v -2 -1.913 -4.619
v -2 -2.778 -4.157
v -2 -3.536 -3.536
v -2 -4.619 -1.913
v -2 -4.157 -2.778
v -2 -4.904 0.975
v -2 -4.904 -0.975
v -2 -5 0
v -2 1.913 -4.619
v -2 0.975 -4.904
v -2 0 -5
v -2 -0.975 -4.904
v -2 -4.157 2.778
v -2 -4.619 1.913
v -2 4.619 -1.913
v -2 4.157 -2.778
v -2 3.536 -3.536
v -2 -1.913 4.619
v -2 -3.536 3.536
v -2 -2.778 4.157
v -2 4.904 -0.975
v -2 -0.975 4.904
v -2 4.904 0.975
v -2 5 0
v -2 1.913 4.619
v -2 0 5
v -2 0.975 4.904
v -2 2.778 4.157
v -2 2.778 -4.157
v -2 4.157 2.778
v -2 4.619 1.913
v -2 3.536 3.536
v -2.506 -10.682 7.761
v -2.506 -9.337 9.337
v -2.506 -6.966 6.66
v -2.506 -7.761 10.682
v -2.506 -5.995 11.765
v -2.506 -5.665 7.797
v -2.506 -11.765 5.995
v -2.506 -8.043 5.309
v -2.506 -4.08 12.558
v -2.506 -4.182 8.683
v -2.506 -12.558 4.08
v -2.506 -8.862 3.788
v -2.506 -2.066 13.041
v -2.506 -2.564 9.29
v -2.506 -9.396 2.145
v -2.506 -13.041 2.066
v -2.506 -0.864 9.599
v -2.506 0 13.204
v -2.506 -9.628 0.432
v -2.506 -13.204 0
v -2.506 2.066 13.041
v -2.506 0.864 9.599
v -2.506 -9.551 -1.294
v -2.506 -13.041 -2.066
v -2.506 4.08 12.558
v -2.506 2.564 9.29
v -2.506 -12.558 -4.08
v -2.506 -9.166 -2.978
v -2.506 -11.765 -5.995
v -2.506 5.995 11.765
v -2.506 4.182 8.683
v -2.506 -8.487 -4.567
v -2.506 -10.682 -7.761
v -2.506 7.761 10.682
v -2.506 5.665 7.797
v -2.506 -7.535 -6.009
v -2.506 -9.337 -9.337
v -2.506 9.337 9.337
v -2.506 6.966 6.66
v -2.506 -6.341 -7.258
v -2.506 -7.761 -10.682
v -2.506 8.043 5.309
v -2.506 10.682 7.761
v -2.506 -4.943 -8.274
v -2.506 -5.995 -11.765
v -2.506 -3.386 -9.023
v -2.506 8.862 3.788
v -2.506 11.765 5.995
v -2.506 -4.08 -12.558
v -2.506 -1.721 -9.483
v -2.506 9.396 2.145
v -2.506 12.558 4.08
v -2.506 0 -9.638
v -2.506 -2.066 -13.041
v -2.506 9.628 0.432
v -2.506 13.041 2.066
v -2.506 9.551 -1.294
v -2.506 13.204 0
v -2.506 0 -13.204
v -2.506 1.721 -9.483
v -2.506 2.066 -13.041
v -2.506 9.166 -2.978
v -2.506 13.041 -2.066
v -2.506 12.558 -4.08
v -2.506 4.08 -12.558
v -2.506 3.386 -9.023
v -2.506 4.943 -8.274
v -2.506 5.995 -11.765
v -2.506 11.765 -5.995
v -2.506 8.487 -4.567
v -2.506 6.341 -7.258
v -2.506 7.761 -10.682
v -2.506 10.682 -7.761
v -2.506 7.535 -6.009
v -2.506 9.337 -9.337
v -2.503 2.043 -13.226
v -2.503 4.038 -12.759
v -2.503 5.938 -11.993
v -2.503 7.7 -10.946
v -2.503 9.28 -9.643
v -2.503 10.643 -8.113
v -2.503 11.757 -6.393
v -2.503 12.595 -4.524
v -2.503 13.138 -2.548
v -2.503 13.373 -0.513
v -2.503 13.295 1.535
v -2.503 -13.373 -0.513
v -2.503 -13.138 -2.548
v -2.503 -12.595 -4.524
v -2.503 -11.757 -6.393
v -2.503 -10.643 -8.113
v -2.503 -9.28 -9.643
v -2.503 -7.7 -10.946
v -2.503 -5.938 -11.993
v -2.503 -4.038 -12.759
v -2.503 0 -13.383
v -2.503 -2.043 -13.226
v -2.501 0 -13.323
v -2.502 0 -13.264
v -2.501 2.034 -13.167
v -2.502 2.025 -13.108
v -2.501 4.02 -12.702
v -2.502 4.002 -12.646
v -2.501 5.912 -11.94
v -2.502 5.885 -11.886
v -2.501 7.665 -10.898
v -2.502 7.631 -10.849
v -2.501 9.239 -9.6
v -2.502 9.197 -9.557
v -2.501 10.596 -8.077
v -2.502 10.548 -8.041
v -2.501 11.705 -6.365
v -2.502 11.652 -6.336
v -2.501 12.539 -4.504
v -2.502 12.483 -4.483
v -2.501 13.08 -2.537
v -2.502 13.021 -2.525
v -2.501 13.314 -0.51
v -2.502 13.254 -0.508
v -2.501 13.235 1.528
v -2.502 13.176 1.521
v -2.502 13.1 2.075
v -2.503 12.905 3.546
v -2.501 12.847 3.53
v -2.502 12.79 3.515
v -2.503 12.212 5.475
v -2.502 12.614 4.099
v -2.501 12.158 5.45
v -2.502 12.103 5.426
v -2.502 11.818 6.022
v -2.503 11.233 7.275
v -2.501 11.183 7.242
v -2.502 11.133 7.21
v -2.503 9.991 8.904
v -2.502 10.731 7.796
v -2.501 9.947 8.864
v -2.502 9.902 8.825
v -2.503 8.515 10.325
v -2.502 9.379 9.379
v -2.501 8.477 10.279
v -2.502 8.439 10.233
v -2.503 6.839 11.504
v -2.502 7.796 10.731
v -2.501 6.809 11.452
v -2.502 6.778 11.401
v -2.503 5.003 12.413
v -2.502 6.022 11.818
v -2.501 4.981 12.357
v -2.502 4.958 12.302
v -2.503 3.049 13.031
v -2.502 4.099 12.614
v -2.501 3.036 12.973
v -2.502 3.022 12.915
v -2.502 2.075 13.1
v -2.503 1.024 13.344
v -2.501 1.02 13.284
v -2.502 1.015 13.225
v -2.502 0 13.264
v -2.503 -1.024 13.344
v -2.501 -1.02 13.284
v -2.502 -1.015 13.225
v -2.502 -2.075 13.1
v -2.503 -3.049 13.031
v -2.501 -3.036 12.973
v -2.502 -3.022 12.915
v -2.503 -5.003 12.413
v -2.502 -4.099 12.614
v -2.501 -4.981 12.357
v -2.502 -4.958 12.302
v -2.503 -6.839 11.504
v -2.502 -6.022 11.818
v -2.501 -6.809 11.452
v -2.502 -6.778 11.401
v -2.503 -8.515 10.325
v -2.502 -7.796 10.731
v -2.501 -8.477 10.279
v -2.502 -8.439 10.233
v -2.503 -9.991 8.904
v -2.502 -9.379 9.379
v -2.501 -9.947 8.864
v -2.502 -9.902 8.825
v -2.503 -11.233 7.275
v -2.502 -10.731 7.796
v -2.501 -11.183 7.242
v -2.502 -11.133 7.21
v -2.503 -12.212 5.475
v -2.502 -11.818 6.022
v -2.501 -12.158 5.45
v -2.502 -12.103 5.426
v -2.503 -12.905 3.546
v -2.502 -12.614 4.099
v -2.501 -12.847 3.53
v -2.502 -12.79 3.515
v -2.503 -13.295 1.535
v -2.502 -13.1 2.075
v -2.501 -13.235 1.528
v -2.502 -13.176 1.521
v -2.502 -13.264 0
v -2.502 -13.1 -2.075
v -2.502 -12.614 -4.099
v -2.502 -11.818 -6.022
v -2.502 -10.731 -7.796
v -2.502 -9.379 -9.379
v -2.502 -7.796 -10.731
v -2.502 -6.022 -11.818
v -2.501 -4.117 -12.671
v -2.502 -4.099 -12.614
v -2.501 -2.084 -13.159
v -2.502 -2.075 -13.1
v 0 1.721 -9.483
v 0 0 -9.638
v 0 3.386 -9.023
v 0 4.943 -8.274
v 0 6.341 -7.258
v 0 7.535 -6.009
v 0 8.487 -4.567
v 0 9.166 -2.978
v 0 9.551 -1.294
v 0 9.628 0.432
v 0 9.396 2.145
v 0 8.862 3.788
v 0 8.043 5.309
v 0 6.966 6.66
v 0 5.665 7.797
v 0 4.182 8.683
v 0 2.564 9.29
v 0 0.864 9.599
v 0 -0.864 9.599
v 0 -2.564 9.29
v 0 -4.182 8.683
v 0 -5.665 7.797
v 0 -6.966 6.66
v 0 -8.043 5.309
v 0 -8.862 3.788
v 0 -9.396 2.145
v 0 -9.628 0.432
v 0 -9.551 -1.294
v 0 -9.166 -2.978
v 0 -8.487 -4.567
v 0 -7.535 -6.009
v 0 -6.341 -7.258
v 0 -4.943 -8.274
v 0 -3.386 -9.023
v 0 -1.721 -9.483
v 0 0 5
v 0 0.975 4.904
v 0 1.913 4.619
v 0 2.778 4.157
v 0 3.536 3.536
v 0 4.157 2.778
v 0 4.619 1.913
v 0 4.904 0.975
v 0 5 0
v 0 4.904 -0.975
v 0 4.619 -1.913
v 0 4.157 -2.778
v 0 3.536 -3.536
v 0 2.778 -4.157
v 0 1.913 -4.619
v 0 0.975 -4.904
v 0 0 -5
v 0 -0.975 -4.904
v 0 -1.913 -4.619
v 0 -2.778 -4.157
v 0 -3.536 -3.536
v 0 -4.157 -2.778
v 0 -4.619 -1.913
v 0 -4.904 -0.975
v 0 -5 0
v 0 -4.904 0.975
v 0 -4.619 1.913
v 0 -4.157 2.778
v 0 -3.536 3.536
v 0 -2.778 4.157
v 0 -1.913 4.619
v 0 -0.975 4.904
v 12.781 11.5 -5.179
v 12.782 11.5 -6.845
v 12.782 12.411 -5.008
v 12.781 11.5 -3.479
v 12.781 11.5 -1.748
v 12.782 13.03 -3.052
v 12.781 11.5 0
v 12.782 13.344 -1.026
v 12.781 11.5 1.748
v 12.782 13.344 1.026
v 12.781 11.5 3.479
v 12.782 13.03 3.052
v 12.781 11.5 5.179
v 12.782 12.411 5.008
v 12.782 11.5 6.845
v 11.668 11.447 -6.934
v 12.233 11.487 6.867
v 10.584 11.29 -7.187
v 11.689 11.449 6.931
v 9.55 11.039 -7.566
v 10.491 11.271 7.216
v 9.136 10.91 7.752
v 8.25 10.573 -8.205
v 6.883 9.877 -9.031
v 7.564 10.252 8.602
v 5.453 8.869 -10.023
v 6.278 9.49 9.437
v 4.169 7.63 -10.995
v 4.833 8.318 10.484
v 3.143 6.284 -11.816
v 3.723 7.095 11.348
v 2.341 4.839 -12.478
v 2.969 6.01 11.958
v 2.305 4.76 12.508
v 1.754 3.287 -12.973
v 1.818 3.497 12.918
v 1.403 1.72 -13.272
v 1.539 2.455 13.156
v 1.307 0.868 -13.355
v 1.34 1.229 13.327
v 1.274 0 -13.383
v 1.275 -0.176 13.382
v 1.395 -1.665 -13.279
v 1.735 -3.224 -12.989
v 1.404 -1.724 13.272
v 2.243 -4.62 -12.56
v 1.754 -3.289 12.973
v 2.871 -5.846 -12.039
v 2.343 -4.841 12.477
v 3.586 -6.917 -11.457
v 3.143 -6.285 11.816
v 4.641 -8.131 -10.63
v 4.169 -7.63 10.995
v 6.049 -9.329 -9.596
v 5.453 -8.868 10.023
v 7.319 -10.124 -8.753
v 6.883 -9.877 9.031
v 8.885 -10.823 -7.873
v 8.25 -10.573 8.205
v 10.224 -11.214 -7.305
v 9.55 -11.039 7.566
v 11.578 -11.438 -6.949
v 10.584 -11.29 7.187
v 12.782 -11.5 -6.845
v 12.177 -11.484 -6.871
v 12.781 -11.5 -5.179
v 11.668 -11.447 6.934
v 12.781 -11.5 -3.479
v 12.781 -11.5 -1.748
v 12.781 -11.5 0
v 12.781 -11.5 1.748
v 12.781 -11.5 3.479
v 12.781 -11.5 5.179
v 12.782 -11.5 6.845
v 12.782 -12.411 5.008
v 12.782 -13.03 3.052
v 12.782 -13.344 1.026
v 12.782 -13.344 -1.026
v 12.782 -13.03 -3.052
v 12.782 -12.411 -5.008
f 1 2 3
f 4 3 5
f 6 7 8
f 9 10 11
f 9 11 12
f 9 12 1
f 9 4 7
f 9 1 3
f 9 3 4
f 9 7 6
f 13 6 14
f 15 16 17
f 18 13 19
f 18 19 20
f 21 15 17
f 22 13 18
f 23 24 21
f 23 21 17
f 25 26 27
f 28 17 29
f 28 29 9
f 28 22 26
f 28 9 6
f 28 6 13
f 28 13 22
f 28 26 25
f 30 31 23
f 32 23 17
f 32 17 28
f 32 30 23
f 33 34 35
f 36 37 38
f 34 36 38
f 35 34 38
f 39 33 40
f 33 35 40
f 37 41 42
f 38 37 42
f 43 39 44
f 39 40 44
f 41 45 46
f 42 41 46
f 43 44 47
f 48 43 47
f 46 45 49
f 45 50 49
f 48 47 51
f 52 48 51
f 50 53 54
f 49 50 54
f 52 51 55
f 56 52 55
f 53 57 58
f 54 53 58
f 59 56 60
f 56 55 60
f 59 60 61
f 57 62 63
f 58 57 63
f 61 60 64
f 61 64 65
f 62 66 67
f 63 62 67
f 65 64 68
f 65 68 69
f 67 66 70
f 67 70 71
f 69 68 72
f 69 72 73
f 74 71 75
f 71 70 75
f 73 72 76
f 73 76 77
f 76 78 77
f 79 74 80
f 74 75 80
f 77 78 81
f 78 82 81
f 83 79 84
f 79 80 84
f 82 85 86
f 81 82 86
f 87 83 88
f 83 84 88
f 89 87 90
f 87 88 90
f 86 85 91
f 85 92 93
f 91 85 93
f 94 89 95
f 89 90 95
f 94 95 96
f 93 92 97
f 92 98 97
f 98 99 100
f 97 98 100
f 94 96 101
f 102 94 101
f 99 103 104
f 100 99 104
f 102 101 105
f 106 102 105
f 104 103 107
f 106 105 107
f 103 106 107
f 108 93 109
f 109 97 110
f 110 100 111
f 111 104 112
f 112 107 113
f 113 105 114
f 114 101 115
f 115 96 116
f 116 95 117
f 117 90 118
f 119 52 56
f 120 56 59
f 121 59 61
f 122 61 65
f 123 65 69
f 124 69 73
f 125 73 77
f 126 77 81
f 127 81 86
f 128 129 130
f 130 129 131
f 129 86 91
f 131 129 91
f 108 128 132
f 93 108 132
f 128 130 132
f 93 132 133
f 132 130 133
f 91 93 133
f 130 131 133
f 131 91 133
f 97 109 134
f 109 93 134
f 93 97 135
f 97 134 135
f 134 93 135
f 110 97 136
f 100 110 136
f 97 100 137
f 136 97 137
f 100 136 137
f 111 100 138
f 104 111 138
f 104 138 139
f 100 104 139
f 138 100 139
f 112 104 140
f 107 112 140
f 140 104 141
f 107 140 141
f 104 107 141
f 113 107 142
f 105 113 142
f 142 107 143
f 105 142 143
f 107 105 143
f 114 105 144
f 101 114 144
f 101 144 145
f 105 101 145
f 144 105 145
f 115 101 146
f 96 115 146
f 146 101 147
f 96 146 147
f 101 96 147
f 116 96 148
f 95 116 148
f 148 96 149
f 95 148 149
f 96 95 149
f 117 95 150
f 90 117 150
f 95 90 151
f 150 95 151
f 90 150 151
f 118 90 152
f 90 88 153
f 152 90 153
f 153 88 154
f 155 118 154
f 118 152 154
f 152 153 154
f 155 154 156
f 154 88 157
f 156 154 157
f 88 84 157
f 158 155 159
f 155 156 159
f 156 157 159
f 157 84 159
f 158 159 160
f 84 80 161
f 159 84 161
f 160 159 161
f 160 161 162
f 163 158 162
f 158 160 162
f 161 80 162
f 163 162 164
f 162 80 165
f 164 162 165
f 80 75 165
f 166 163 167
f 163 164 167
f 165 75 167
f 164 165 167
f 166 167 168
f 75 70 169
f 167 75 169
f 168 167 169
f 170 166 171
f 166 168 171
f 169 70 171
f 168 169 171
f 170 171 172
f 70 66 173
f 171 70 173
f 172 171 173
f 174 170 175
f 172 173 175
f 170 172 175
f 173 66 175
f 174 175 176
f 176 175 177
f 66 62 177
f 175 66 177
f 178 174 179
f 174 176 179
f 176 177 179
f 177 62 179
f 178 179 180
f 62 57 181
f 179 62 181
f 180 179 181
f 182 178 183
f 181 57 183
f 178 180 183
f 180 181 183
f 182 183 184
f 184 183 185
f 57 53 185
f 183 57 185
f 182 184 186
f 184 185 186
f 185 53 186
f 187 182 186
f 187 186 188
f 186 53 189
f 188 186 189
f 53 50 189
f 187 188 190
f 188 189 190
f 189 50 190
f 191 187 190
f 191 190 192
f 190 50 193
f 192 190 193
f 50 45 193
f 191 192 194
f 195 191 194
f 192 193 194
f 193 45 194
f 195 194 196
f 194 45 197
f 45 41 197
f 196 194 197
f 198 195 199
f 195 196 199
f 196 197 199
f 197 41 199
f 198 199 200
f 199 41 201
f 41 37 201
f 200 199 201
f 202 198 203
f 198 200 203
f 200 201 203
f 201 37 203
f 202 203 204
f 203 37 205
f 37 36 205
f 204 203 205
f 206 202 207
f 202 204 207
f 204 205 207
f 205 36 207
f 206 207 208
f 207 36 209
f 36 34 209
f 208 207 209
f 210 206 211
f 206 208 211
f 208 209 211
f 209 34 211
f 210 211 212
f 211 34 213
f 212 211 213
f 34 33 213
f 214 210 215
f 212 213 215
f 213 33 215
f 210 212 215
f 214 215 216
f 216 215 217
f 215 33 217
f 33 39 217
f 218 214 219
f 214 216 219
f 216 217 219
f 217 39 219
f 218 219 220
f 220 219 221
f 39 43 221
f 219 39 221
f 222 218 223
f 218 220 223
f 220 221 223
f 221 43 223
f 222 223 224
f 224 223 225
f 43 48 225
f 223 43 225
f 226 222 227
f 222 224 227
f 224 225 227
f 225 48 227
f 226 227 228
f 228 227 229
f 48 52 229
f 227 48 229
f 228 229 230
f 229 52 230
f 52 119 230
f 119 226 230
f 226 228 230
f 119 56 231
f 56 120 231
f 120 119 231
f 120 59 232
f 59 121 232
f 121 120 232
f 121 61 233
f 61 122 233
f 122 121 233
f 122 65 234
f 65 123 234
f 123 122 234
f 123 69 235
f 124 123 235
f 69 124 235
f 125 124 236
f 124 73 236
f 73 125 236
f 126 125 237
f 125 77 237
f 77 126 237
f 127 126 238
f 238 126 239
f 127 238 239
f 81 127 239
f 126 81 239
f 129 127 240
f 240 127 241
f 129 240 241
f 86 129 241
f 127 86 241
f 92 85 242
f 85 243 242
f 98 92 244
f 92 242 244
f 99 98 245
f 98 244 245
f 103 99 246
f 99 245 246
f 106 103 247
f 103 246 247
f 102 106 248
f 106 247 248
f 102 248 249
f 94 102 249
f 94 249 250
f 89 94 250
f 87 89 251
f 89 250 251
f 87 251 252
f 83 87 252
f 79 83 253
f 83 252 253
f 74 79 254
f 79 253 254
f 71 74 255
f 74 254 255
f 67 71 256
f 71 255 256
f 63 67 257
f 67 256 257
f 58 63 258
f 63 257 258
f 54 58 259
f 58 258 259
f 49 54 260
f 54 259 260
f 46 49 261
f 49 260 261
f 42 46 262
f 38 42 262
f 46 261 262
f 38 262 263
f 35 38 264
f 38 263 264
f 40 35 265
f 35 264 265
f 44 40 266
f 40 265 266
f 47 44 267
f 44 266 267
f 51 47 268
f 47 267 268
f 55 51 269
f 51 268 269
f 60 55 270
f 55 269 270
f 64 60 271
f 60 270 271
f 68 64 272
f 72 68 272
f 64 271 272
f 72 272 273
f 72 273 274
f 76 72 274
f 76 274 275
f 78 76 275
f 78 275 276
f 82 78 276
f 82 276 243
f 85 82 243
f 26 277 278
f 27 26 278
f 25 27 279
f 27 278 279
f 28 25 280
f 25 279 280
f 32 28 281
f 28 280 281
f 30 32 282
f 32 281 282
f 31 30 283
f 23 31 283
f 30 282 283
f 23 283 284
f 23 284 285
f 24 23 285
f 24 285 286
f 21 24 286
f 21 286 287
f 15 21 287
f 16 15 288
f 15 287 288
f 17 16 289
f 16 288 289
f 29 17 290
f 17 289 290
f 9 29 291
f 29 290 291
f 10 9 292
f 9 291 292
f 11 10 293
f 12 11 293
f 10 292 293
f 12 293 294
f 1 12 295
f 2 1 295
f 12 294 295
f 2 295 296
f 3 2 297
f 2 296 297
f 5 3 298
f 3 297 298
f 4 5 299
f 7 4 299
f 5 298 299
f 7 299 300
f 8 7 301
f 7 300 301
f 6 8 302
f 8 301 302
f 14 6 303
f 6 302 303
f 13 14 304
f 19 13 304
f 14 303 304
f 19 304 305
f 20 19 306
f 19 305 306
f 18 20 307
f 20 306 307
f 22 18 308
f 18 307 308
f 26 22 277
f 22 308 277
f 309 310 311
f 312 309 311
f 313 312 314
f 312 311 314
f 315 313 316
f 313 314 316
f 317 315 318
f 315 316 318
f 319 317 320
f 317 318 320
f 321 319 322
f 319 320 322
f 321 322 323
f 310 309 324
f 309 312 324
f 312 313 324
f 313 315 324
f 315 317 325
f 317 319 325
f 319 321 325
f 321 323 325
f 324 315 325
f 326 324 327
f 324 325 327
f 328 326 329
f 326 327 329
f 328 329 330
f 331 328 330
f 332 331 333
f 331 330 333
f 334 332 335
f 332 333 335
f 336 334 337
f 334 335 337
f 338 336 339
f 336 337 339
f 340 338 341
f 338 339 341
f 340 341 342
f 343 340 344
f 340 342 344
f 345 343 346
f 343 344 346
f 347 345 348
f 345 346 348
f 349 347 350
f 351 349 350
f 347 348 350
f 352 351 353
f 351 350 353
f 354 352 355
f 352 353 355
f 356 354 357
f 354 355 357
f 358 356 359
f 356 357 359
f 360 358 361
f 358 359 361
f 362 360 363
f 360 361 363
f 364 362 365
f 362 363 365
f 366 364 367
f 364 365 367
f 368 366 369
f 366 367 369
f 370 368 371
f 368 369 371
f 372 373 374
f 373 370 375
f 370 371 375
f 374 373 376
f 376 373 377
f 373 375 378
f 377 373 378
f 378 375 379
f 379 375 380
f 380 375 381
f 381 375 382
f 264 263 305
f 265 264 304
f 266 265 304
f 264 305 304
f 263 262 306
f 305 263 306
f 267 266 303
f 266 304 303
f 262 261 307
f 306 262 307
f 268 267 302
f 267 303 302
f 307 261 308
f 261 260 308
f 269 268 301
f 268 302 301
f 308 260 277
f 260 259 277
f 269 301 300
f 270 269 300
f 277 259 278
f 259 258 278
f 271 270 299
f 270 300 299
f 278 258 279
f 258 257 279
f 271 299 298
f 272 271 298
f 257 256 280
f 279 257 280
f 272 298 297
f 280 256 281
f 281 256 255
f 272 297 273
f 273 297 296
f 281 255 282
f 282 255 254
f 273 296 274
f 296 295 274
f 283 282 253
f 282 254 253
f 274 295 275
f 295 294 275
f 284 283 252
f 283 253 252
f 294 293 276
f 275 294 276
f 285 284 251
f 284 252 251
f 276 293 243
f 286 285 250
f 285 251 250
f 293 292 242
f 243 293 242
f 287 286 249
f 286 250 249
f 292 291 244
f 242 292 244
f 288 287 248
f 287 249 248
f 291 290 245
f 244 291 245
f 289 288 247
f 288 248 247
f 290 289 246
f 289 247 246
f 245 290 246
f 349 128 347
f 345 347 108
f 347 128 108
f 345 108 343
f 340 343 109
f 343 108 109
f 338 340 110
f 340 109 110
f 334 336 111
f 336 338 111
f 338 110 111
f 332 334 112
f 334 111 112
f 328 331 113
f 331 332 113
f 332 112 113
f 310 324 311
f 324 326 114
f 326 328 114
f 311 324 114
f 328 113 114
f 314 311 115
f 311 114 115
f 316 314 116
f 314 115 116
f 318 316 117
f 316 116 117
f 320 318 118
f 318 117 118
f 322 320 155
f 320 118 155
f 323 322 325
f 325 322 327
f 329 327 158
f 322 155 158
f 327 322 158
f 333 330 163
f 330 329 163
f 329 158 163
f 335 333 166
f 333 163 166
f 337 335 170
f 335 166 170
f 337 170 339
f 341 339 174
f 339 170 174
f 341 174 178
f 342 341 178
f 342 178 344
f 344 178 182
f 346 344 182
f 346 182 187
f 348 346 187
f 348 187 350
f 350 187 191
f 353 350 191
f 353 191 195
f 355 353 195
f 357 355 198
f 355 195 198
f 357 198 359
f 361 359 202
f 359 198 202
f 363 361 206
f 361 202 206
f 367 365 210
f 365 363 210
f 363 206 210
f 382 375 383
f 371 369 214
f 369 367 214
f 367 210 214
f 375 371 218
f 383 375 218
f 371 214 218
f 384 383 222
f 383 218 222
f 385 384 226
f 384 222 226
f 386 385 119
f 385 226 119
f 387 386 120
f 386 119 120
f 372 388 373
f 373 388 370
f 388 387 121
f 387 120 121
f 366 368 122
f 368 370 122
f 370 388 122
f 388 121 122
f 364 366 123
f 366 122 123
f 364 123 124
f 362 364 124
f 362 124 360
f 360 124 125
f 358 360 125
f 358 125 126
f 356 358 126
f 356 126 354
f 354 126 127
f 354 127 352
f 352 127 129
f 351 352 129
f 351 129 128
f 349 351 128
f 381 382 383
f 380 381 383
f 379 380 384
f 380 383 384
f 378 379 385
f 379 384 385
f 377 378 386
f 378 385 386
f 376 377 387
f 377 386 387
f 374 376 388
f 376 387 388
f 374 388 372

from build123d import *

# Parameters (mm, degrees)
SKETCH5_R           = 5
BOSS_EXTRUDE2_DEPTH = 2


with BuildPart() as part:
    # Sketch1 → Revolve1 (revolve)
    with BuildSketch(Plane(origin=(0, 0, 0), x_dir=(1, 0, 0), z_dir=(0, 1, 0))):
        with BuildLine():
            Line((12.781543507, 13.383116119), (-2.50303312, 13.383116119))
            ThreePointArc((-2.50303312, 13.383116119), (-2.501361875, 13.293526957), (-2.506133274, 13.204049335))
            Line((-2.506133274, 13.204049335), (-2.506133274, 9.63773694))
            Line((-2.506133274, 9.63773694), (0, 9.63773694))
            Line((0, 9.63773694), (0, 3.705))
            Line((0, 3.705), (0, 0))
            Line((0, 0), (4.789576981, 0))
            Line((4.789576981, 0), (4.808638309, 3.705))
            ThreePointArc((4.808638309, 3.705), (5.009621244, 3.664180843), (5.185678757, 3.558994837))
            ThreePointArc((5.185678757, 3.558994837), (7.965698705, 8.014106646), (12.465543511, 10.721121396))
            ThreePointArc((12.465543511, 10.721121396), (12.633558311, 10.915283437), (12.780786925, 11.125644095))
            Line((12.780786925, 11.125644095), (12.781543507, 13.383116119))
        make_face()
    revolve(axis=Axis((0, 0, 0), (1, 0, 0)))

    # Sketch2 → Revolved-Cut2 (revolve, cut)
    with BuildSketch(Plane.ZY.offset(-12.773866726)):
        Polygon((13.385193973, 0), (-13.385193973, 0), (-16.077753665, 0), (-16.077753665, 11.5), (15.518432284, 11.5), (15.518432284, 0), align=None)
    revolve(axis=Axis((12.773866726, 0, -16.077753665), (0, 0, 1)), mode=Mode.SUBTRACT)

    # Sketch5 → Boss-Extrude2 (add)
    with BuildSketch(Plane.ZY):
        Circle(SKETCH5_R)
    extrude(amount=BOSS_EXTRUDE2_DEPTH)


solid = part.part
